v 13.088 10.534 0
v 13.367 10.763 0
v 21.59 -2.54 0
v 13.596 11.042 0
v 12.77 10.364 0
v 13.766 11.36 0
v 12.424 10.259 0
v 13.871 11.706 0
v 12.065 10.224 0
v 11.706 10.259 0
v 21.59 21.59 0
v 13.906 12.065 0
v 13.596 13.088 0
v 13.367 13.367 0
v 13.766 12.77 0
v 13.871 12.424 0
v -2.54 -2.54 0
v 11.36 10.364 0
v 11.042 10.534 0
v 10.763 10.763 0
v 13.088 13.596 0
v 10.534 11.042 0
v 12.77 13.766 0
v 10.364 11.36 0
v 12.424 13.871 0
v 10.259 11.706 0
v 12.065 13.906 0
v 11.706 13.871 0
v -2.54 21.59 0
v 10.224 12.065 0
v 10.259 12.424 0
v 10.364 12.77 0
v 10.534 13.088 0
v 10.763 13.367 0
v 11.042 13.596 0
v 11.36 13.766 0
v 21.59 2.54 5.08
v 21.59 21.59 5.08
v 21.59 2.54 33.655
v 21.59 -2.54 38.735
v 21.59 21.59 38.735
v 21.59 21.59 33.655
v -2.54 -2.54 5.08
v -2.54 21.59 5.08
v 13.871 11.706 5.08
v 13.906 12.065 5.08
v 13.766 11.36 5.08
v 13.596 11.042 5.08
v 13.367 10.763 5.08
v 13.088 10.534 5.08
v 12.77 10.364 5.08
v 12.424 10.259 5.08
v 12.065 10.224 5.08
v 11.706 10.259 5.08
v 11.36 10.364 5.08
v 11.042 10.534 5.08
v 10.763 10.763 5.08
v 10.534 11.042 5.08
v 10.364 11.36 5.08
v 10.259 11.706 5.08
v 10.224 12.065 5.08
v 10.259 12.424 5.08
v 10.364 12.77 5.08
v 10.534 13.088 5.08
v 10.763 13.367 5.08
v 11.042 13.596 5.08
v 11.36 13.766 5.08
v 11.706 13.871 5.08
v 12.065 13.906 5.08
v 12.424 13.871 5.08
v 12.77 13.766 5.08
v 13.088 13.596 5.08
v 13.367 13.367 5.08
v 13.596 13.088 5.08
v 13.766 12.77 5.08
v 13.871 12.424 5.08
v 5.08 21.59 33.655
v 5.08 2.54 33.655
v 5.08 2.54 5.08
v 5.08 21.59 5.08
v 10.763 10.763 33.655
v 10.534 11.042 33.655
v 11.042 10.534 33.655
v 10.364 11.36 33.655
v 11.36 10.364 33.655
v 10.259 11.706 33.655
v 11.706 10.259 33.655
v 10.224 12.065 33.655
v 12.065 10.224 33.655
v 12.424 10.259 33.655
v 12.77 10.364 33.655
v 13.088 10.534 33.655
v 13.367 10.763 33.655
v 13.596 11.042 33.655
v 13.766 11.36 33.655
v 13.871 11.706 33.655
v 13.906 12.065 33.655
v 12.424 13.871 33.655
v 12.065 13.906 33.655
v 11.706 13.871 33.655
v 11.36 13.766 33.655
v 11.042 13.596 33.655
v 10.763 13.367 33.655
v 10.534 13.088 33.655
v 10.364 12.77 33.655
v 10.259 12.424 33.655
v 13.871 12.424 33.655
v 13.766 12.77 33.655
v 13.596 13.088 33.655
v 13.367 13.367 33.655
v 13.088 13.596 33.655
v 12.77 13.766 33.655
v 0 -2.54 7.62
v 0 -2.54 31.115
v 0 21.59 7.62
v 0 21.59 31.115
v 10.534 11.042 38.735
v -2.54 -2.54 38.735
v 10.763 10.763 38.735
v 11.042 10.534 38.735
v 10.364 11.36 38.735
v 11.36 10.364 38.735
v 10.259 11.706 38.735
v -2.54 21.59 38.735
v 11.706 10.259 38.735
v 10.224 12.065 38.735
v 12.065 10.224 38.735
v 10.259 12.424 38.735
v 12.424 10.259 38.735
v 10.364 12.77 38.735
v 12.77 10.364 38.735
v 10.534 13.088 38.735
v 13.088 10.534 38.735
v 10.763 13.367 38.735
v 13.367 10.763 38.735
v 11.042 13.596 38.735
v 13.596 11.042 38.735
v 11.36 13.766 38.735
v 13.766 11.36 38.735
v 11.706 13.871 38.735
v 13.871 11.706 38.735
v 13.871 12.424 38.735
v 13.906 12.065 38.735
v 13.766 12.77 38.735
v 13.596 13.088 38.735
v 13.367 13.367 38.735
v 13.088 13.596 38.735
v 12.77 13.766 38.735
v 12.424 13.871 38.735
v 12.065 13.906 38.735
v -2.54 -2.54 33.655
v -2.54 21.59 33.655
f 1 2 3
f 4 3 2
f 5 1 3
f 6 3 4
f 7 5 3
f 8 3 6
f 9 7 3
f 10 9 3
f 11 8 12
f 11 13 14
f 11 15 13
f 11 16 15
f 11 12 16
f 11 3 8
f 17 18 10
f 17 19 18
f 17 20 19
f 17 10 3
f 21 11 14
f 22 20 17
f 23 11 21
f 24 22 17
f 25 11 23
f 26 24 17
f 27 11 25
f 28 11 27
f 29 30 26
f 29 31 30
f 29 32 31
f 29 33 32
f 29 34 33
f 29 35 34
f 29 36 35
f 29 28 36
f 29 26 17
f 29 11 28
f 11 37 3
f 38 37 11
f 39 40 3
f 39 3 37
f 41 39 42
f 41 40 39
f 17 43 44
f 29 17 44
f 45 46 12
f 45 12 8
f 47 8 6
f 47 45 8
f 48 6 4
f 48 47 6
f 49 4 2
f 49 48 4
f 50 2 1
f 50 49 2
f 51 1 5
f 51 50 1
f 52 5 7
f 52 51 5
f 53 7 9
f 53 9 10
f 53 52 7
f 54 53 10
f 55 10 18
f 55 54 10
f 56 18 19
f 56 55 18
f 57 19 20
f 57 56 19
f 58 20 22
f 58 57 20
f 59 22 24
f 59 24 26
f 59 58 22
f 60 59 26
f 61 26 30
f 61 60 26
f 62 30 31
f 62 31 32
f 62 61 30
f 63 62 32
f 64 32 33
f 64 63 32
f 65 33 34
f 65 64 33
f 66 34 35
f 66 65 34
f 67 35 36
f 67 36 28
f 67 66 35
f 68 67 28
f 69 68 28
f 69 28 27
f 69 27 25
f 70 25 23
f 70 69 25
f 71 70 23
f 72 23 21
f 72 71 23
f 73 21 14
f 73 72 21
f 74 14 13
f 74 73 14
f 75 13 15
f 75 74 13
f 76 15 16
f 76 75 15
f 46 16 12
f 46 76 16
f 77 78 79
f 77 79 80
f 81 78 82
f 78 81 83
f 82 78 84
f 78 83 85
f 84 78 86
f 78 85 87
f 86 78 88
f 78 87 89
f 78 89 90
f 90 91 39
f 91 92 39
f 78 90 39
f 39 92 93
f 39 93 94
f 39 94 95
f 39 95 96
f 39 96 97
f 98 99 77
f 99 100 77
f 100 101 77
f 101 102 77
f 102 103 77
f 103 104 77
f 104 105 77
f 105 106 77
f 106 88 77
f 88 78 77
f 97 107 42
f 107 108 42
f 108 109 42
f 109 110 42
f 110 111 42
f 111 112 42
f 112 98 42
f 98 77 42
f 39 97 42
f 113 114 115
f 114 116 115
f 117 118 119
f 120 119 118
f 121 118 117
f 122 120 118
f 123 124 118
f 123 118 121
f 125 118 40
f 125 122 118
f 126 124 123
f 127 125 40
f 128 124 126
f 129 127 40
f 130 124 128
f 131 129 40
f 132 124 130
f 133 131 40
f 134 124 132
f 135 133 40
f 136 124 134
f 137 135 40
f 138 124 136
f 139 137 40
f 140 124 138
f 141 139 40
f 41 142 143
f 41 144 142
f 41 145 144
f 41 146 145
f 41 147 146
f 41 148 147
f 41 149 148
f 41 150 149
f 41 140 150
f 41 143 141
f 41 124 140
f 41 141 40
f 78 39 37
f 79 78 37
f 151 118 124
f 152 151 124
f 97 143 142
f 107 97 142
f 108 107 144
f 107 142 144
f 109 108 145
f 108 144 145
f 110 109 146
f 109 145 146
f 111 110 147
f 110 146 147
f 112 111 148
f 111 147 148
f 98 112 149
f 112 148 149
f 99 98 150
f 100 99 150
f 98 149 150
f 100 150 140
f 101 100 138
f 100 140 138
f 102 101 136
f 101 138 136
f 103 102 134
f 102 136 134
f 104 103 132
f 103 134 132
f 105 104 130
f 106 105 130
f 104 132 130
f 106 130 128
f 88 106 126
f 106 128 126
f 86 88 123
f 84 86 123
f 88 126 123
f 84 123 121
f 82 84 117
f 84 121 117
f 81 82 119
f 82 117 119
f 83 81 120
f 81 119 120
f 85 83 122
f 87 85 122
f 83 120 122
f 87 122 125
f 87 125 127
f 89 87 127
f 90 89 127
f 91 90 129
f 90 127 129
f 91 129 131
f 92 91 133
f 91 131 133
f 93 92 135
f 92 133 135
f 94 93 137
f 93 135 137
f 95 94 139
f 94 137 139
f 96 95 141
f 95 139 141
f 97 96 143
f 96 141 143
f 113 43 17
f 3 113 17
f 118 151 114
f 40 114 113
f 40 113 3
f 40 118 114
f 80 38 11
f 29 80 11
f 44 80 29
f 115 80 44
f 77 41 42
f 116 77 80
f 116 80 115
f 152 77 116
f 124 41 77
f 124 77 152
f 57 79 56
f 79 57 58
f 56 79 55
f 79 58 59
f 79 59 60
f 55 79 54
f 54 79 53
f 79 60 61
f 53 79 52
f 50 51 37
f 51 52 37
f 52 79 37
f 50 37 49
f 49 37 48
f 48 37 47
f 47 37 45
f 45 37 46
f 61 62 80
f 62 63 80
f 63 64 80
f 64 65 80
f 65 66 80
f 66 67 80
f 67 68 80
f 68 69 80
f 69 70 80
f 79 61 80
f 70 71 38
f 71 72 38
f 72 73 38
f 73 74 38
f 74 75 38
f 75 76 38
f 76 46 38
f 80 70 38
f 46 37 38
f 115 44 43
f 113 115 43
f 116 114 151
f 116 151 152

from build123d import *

# Parameters (mm, degrees)
BOSS_EXTRUDE1_DEPTH = 38.735
SKETCH2_W           = 24.13
SKETCH2_H           = 24.13
SKETCH2_R           = 1.8415
BOSS_EXTRUDE2_DEPTH = 5.08
BOSS_EXTRUDE3_START = -5.08
SKETCH3_W           = 24.13
SKETCH3_H           = 24.13
SKETCH3_R           = 1.8415
BOSS_EXTRUDE3_DEPTH = 5.08
SKETCH4_W           = 38.735
SKETCH4_H           = 5.875923506
BOSS_EXTRUDE5_DEPTH = 21.59
SKETCH5_W           = 28.575
SKETCH5_H           = 2.54
CUT_EXTRUDE1_DEPTH  = 16.51
CHAMFER2_SIZE       = 2.54


with BuildPart() as part:
    # Sketch1 → Boss-Extrude1 (new body)
    with BuildSketch(Plane.XY):
        Polygon((0, 0), (21.59, 0), (21.59, 5.08), (5.08, 5.08), (5.08, 21.59), (0, 21.59), (0, 5.08), align=None)
    extrude(amount=BOSS_EXTRUDE1_DEPTH)

    # Sketch2 → Boss-Extrude2 (add)
    with BuildSketch(Plane.XY.offset(38.735)):
        with Locations((9.525, 9.525)):
            Rectangle(SKETCH2_W, SKETCH2_H)
        with Locations((12.065, 12.065)):
            Circle(SKETCH2_R, mode=Mode.SUBTRACT)
    extrude(amount=-BOSS_EXTRUDE2_DEPTH)

    # Sketch3 → Boss-Extrude3 (add)
    with BuildSketch(Plane(origin=(0, 0, 0), x_dir=(-1, 0, 0), z_dir=(0, 0, -1)).offset(BOSS_EXTRUDE3_START)):
        with Locations((-9.525, 9.525)):
            Rectangle(SKETCH3_W, SKETCH3_H)
        with Locations(Location((-12.065, 12.065, 0), (0, 0, 180))):
            Circle(SKETCH3_R, mode=Mode.SUBTRACT)
    extrude(amount=BOSS_EXTRUDE3_DEPTH)

    # Sketch4 → Boss-Extrude5 (add)
    with BuildSketch(Plane(origin=(21.59, 0, 0), x_dir=(0, 0, -1), z_dir=(1, 0, 0))):
        with Locations((-19.3675, 0.397961753)):
            Rectangle(SKETCH4_W, SKETCH4_H)
    extrude(amount=-BOSS_EXTRUDE5_DEPTH)

    # Sketch5 → Cut-Extrude1 (cut)
    with BuildSketch(Plane(origin=(21.59, 0, 0), x_dir=(0, 0, -1), z_dir=(1, 0, 0))):
        with Locations((-19.3675, 3.81)):
            Rectangle(SKETCH5_W, SKETCH5_H)
    extrude(amount=-CUT_EXTRUDE1_DEPTH, mode=Mode.SUBTRACT)

    # Chamfer2
    chamfer2_edges = [part.edges().sort_by_distance(p)[0] for p in [
        (0, 9.525, 33.655),
        (0, 9.525, 5.08),
    ]]
    chamfer(chamfer2_edges, length=CHAMFER2_SIZE - 0.0001)  # a hair under: the kernel refuses the full size


solid = part.part
